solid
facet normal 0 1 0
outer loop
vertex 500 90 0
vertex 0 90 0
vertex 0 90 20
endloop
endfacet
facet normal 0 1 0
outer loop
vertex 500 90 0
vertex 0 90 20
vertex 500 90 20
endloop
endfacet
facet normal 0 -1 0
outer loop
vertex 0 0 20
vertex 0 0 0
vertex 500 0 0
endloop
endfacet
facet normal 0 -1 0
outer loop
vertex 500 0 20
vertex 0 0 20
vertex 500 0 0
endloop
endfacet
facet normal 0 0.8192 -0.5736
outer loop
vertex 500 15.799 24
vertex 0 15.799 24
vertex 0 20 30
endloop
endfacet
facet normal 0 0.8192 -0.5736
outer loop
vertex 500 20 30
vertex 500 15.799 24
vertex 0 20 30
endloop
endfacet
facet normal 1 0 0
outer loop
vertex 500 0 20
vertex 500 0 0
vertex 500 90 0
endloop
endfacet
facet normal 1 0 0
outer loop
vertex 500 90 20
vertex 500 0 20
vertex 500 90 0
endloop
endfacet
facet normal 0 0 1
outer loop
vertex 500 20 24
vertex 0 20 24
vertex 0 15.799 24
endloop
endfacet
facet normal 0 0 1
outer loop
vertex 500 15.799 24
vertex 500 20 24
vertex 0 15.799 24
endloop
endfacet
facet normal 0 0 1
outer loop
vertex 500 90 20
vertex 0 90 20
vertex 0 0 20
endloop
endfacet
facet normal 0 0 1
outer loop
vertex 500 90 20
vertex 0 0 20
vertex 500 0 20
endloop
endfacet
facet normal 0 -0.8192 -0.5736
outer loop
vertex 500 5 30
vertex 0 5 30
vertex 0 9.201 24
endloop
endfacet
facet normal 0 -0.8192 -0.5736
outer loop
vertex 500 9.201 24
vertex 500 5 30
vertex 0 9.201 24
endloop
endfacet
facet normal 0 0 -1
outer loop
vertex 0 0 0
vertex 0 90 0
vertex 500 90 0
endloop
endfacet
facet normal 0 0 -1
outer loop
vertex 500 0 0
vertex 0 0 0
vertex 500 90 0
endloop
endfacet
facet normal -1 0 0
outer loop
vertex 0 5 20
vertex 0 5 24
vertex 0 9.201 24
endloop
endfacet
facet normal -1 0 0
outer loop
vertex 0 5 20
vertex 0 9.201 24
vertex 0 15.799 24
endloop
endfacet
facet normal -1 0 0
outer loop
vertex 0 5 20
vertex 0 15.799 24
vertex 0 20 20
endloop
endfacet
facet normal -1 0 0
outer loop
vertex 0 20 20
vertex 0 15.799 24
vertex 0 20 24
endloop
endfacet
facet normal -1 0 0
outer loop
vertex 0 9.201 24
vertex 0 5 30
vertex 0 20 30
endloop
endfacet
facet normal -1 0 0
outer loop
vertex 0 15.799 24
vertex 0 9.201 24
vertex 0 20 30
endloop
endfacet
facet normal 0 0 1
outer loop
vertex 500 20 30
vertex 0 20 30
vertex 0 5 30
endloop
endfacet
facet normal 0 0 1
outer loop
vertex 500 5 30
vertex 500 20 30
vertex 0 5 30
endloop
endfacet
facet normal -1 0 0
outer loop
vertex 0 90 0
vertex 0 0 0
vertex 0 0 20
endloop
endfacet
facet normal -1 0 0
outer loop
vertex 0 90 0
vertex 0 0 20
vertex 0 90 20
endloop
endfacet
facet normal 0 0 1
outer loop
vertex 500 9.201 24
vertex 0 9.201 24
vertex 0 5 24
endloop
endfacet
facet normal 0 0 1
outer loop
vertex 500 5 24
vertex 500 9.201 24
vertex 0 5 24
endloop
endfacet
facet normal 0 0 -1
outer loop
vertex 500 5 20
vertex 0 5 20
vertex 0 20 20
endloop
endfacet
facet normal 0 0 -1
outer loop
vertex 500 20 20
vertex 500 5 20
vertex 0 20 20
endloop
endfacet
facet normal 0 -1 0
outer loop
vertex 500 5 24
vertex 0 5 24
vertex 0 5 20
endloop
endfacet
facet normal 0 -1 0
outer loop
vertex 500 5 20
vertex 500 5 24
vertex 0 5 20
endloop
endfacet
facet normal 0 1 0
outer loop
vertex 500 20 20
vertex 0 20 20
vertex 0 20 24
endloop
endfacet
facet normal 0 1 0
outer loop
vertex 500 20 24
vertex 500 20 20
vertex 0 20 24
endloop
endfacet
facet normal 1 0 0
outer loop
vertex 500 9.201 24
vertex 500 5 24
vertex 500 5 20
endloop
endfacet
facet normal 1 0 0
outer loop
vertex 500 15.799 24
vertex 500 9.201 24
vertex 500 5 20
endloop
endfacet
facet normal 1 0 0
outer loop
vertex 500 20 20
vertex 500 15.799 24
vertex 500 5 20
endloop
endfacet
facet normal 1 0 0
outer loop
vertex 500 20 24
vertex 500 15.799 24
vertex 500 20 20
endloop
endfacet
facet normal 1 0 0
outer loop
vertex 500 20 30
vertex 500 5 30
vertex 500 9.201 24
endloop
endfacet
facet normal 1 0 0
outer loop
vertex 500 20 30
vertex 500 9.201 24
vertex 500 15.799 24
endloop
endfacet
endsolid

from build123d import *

# Parameters (mm, degrees)
F0_W     = 500
F0_H     = 90
F1_DEPTH = 20
F3_DEPTH = 500


with BuildPart() as f1:
    # F0 (on Top) → F1 (new body)
    with BuildSketch(Plane.XY):
        with Locations((250, 45)):
            Rectangle(F0_W, F0_H)
    extrude(amount=F1_DEPTH)


with BuildPart() as f3:
    # F2 (on Right) → F3 (new body)
    with BuildSketch(Plane.YZ):
        Polygon((5, 20), (20, 20), (20, 24), (15.798755, 24), (20, 30), (5, 30), (9.201245, 24), (5, 24), align=None)
    extrude(amount=F3_DEPTH)


solid = Compound([f1.part, f3.part])
